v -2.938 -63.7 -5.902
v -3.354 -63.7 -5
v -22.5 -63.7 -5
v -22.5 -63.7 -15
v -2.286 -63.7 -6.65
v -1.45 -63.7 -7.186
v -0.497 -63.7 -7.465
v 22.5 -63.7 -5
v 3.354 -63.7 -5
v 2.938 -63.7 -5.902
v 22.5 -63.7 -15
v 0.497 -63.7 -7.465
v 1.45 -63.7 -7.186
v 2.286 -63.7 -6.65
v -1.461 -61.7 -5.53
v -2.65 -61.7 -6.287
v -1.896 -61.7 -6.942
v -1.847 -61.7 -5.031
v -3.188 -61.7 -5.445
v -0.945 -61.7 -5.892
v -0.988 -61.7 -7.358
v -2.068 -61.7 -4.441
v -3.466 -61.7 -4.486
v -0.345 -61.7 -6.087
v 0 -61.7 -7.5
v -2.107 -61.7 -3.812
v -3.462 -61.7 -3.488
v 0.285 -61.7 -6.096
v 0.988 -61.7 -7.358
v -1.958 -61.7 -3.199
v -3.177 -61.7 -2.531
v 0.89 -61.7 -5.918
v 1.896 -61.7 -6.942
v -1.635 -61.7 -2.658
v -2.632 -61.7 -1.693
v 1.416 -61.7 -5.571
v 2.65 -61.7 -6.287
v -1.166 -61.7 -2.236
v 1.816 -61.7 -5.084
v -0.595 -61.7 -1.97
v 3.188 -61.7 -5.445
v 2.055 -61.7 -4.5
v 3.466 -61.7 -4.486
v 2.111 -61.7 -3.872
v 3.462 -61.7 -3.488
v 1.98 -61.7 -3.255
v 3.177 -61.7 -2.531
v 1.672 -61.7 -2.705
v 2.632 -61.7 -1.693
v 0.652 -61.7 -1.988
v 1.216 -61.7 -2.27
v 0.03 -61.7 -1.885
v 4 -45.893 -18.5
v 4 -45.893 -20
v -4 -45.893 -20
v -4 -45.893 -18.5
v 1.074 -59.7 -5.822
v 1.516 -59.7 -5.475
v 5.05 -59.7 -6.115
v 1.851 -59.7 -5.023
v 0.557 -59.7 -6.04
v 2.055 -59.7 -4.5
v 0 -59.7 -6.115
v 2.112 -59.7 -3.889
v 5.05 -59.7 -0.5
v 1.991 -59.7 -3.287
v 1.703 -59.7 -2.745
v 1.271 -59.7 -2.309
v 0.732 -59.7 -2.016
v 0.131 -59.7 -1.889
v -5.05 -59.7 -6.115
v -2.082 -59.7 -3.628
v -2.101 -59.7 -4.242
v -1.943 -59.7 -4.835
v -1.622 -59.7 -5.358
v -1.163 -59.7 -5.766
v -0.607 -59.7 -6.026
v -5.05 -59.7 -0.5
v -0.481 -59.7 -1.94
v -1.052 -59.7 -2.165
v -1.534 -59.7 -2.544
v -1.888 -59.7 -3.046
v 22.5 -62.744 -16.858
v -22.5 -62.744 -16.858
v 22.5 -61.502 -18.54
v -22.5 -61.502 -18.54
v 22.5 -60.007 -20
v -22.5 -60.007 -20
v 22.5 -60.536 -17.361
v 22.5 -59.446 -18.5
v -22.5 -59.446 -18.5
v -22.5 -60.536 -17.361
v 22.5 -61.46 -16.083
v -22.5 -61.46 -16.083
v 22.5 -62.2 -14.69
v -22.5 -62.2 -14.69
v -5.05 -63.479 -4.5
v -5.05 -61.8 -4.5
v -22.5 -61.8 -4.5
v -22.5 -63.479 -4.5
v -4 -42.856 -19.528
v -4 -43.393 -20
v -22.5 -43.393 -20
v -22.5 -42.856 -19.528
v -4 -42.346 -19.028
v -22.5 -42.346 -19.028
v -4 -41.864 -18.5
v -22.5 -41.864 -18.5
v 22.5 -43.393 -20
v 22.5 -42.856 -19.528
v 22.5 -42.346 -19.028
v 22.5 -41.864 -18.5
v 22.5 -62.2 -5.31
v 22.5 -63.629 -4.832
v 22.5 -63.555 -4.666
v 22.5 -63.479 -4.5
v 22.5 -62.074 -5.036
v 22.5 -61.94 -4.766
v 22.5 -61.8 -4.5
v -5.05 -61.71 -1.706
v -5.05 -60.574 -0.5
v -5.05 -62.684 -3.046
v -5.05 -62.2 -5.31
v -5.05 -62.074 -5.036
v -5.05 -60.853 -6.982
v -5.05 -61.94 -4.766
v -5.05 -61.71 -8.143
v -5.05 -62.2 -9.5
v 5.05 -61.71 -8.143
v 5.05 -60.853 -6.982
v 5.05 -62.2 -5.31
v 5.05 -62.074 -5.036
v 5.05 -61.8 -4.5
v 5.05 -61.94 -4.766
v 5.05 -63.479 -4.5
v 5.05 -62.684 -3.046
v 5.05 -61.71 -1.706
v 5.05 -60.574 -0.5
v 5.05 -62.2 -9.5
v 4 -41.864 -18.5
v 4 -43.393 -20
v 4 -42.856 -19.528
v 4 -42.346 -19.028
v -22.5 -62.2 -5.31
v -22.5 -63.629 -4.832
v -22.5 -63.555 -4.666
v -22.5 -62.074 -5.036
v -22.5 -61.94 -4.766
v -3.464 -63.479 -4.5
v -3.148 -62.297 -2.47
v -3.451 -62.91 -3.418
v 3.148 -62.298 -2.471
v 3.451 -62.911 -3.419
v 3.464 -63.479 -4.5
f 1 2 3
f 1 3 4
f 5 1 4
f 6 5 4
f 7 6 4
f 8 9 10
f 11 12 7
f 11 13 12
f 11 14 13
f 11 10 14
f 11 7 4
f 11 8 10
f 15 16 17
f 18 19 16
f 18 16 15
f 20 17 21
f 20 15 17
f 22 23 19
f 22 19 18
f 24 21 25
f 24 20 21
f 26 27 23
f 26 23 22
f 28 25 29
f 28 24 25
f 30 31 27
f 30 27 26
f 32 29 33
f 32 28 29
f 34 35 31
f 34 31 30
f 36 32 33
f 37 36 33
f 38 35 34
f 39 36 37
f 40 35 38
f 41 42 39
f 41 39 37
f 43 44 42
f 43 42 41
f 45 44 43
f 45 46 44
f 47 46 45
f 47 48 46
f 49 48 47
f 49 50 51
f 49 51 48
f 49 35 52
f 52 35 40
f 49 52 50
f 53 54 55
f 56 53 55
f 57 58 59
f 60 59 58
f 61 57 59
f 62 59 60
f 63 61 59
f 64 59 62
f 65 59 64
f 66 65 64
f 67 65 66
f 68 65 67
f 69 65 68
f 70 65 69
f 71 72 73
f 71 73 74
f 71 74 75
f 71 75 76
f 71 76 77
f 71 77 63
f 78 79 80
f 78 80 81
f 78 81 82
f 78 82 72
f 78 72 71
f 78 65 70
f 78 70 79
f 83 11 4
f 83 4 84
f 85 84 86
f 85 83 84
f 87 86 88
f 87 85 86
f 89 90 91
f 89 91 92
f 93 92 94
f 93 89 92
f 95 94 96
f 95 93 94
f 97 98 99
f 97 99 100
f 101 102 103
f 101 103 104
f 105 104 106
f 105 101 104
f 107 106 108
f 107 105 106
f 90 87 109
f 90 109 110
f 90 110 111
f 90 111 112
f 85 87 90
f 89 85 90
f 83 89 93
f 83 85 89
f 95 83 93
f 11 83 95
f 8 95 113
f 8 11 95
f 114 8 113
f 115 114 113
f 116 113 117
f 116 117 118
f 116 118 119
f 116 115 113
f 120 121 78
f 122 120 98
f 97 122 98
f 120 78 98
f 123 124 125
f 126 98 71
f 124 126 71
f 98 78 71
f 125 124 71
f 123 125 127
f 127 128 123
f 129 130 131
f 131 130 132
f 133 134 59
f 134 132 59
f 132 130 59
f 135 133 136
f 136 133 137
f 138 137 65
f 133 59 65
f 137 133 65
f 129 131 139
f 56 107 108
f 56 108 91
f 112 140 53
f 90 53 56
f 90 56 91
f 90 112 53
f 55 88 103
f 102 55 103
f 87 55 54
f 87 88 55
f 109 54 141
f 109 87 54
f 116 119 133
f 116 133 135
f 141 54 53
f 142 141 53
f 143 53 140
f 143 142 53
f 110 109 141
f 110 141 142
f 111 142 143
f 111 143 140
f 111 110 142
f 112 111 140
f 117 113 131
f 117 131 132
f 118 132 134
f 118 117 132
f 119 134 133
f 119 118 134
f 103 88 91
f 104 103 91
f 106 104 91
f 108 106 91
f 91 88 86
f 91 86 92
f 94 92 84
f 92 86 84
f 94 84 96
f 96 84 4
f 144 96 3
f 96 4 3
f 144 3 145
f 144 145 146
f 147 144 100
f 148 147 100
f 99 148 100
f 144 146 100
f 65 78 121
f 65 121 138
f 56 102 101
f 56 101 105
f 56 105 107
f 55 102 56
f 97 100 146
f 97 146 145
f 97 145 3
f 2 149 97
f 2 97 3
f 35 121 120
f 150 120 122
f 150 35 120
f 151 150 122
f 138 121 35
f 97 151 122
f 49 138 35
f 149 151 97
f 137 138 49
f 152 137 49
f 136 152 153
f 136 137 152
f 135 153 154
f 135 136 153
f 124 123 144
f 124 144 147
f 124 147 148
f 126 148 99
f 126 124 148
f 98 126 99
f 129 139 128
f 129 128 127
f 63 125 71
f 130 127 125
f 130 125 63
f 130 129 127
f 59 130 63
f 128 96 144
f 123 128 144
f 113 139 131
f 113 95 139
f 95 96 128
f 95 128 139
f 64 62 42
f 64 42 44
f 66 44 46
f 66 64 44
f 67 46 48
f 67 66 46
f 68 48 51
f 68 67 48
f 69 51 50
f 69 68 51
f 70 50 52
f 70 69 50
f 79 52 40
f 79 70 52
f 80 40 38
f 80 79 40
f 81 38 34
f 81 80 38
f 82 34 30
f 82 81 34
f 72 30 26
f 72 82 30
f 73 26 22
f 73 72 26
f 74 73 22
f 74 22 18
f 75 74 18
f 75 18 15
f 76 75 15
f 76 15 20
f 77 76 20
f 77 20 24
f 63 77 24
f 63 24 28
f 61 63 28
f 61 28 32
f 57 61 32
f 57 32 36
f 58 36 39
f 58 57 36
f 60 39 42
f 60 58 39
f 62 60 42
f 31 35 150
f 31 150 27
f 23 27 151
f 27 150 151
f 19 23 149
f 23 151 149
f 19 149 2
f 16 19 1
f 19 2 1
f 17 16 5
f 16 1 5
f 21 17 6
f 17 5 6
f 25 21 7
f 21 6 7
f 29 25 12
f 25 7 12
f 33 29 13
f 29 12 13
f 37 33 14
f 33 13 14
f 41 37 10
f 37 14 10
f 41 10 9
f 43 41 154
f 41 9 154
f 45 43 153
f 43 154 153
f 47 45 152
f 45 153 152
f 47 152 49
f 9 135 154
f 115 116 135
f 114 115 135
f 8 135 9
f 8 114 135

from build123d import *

# Parameters (mm, degrees)
MODEL_R                   = 8.35
RESSALTO_EXTRUS_O2_DEPTH  = 4
ESBO_O5_W                 = 2
ESBO_O5_H                 = 24
RESSALTO_EXTRUS_O3_DEPTH  = 20
ESBO_O6_OUTSIDE_W         = 30.002
ESBO_O6_OUTSIDE_H         = 34.002
ESBO_O6_OUTSIDE_R         = 13
CORTE_EXTRUS_O1_DEPTH     = 72.292987034
CORTE_EXTRUS_O2_DEPTH     = 72.292987124
RESSALTO_EXTRUS_O4_DEPTH  = 4
CORTE_EXTRUS_O3_DEPTH     = 38.486664414
RESSALTO_EXTRUS_O5_START  = 0.5
RESSALTO_EXTRUS_O5_DEPTH  = 45
RESSALTO_EXTRUS_O6_START  = 0.5
ESBO_O14_R                = 2.115
RESSALTO_EXTRUS_O6_DEPTH  = 3.779219
CORTE_EXTRUS_O4_DEPTH     = 10.1
CORTE_EXTRUS_O7_DEPTH     = 10
ESBO_O17_R                = 3.5
CORTE_EXTRUS_O8_DEPTH     = 2
CORTE_EXTRUS_O11_REACH    = 75.217
ESBO_O19_W                = 67.006666236
ESBO_O19_H                = 28.204946311
CORTE_EXTRUS_O9_DEPTH     = 52.948283002
CORPO_MOVER_COPIAR2_ANGLE = 180


with BuildPart() as part:
    # Model → Ressalto-extrusão2 (new body)
    with BuildSketch(Plane.XY):
        Polygon((0, 44.200000002), (0, 59.200000002), (-5.55, 59.200000002), (-5.55, 63.700000002), (-23, 63.700000002), (-23, 39.700000002), (-5.55, 39.700000002), (-5.55, 44.200000002), align=None)
        with Locations((-13.5, 51.700000002)):
            Circle(MODEL_R, mode=Mode.SUBTRACT)
    extrude(amount=RESSALTO_EXTRUS_O2_DEPTH)

    # Esboço5 → Ressalto-extrusão3 (add)
    with BuildSketch(Plane(origin=(0, 0, 0), x_dir=(-1, 0, 0), z_dir=(0, 0, -1))):
        with Locations((24, 51.700000002)):
            Rectangle(ESBO_O5_W, ESBO_O5_H)
    extrude(amount=-RESSALTO_EXTRUS_O3_DEPTH)

    # Esboço6 outside → Corte-extrusão1 (cut, through all)
    with BuildSketch(Plane.ZY.offset(25)):
        with Locations((10, 51.7)):
            Rectangle(ESBO_O6_OUTSIDE_W, ESBO_O6_OUTSIDE_H)
        with Locations((10, 51.700000002)):
            Circle(ESBO_O6_OUTSIDE_R, mode=Mode.SUBTRACT)
    extrude(amount=-CORTE_EXTRUS_O1_DEPTH, mode=Mode.SUBTRACT)

    # Esboço8 → Corte-extrusão2 (cut, through all)
    with BuildSketch(Plane.ZY.offset(25)):
        Polygon((7.885, 51.700000002), (10, 49.585000002), (12.115, 51.700000002), (10, 53.815000002), align=None)
    extrude(amount=-CORTE_EXTRUS_O2_DEPTH, mode=Mode.SUBTRACT)

    # Espelhar1: part across plane


with BuildPart() as part_1:
    add(part.part)
    add(part.part.mirror(Plane(origin=(0, 44.200000002, 4), x_dir=(0, 0, 1), z_dir=(-1, 0, 0))))

    # Esboço9 → Ressalto-extrusão4 (add)
    with BuildSketch(Plane.XY.offset(4)):
        Polygon((0, 59.200000002), (4, 59.200000002), (4, 44.200000002), (-4, 44.200000002), (-4, 59.200000002), align=None)
    extrude(amount=RESSALTO_EXTRUS_O4_DEPTH)

    # Esboço10 → Corte-extrusão3 (cut, through all)
    with BuildSketch(Plane(origin=(0, 59.200000002, 0), x_dir=(1, 0, 0), z_dir=(0, 1, 0))):
        Polygon((0, -1.885), (-2.115, -4), (0, -6.115), (2.115, -4), align=None)
    extrude(amount=-CORTE_EXTRUS_O3_DEPTH, mode=Mode.SUBTRACT)


with BuildPart() as body_2:
    # Esboço13 → Ressalto-extrusão5 (new body)
    with BuildSketch(Plane.ZY.offset(-23).offset(RESSALTO_EXTRUS_O5_START)):
        with BuildLine():
            Line((18.5, 43.95403331), (18.5, 59.445966694))
            ThreePointArc((18.5, 59.445966694), (16.73742843, 61.019713418), (14.69041576, 62.200000002))
            Line((14.69041576, 62.200000002), (5.30958424, 62.200000002))
            ThreePointArc((5.30958424, 62.200000002), (4.900858659, 62.0077038), (4.5, 61.79950494))
            Line((4.5, 61.79950494), (4.5, 63.479218991))
            ThreePointArc((4.5, 63.479218991), (4.748839551, 63.592237552), (5, 63.700000002))
            Line((5, 63.700000002), (15, 63.700000002))
            ThreePointArc((15, 63.700000002), (17.724005232, 62.156564599), (20, 60.006623865))
            Line((20, 60.006623865), (20, 43.393376139))
            ThreePointArc((20, 43.393376139), (19.281560672, 42.597657914), (18.5, 41.863842216))
            Line((18.5, 41.863842216), (18.5, 43.95403331))
        make_face()
    extrude(amount=RESSALTO_EXTRUS_O5_DEPTH)

    # Esboço14 → Ressalto-extrusão6 (add)
    with BuildSketch(Plane(origin=(0, 59.200000002, 0), x_dir=(1, 0, 0), z_dir=(0, 1, 0)).offset(RESSALTO_EXTRUS_O6_START)):
        Polygon((5.05, -4), (5.05, -8), (5.05, -9.5), (-5.05, -9.5), (-5.05, -8), (-5.05, -4), (-5.05, -0.5), (5.05, -0.5), align=None)
        with Locations(Location((0, -4, 0), (0, 0, 346.325447319))):
            Circle(ESBO_O14_R, mode=Mode.SUBTRACT)
    extrude(amount=RESSALTO_EXTRUS_O6_DEPTH)

    # Esboço15 → Corte-extrusão4 (cut)
    with BuildSketch(Plane(origin=(5.05, 0, 0), x_dir=(0, 0, -1), z_dir=(1, 0, 0))):
        with BuildLine():
            Line((-5.561651151, 63.918881272), (-4.5, 63.918881272))
            Line((-4.5, 63.918881272), (-4.5, 64.979109715))
            Line((-4.5, 64.979109715), (0, 64.979109715))
            Line((0, 64.979109715), (0, 60.006623865))
            ThreePointArc((0, 60.006623865), (-2.520500092, 62.332830346), (-5.561651151, 63.918881272))
        make_face()
    extrude(amount=-CORTE_EXTRUS_O4_DEPTH, mode=Mode.SUBTRACT)

    # Esboço18 → Corte-extrusão7 (cut)
    with BuildSketch(Plane.XY.offset(20)):
        Polygon((-4, 45.893376139), (0, 45.893376139), (4, 45.893376139), (4, 37.813192245), (-4, 37.813192245), align=None)
    extrude(amount=-CORTE_EXTRUS_O7_DEPTH, mode=Mode.SUBTRACT)

    # Esboço17 → Corte-extrusão8 (cut)
    with BuildSketch(Plane(origin=(0, 63.700000002, 0), x_dir=(1, 0, 0), z_dir=(0, 1, 0))):
        with Locations((0, -4)):
            Circle(ESBO_O17_R)
    extrude(amount=-CORTE_EXTRUS_O8_DEPTH, mode=Mode.SUBTRACT)

    # Corte-extrusão11: up to this face of the body (flat: up to its plane)
    corte_extrus_o11_end = Plane(body_2.part.faces().sort_by_distance((-5.05, 61.009194207, 5.162360776))[0])
    # Esboço21 → Corte-extrusão11 (cut, up to the picked face)
    with BuildSketch(Plane(origin=(5.05, 0, 0), x_dir=(0, 0, -1), z_dir=(1, 0, 0)), mode=Mode.PRIVATE) as corte_extrus_o11_sk1:
        with BuildLine():
            Line((-6.115, 59.700000002), (-9.5, 59.700000002))
            Line((-9.5, 59.700000002), (-9.5, 62.200000002))
            ThreePointArc((-9.5, 62.200000002), (-7.531688037, 61.3234494), (-6.115, 59.700000002))
        make_face()
    corte_extrus_o11_tool1 = split(extrude(corte_extrus_o11_sk1.sketch, amount=-CORTE_EXTRUS_O11_REACH, mode=Mode.PRIVATE), bisect_by=corte_extrus_o11_end, keep=Keep.BOTH, mode=Mode.PRIVATE)
    add(corte_extrus_o11_tool1.solids().sort_by(Axis((5.05, 60.667689, 8.211637), (-1, 0, 0)))[0], mode=Mode.SUBTRACT)


with BuildPart() as part_2:
    # Corpo-Mover/Copiar1: moved
    add(part_1.part.moved(Location((0, 0, -38.699148431))))

    # Esboço19 → Corte-extrusão9 (cut, through all)
    with BuildSketch(Plane(origin=(0, 63.700000002, 0), x_dir=(1, 0, 0), z_dir=(0, 1, 0))):
        with Locations((-0.756912401, 28.10560681)):
            Rectangle(ESBO_O19_W, ESBO_O19_H)
    extrude(amount=-CORTE_EXTRUS_O9_DEPTH, mode=Mode.SUBTRACT)


with BuildPart() as body_2_1:
    # Corpo-Mover/Copiar2: moved
    add(body_2.part.rotate(Axis((0, 0, 0), (1, 0, 0)), CORPO_MOVER_COPIAR2_ANGLE))


solid = body_2_1.part
